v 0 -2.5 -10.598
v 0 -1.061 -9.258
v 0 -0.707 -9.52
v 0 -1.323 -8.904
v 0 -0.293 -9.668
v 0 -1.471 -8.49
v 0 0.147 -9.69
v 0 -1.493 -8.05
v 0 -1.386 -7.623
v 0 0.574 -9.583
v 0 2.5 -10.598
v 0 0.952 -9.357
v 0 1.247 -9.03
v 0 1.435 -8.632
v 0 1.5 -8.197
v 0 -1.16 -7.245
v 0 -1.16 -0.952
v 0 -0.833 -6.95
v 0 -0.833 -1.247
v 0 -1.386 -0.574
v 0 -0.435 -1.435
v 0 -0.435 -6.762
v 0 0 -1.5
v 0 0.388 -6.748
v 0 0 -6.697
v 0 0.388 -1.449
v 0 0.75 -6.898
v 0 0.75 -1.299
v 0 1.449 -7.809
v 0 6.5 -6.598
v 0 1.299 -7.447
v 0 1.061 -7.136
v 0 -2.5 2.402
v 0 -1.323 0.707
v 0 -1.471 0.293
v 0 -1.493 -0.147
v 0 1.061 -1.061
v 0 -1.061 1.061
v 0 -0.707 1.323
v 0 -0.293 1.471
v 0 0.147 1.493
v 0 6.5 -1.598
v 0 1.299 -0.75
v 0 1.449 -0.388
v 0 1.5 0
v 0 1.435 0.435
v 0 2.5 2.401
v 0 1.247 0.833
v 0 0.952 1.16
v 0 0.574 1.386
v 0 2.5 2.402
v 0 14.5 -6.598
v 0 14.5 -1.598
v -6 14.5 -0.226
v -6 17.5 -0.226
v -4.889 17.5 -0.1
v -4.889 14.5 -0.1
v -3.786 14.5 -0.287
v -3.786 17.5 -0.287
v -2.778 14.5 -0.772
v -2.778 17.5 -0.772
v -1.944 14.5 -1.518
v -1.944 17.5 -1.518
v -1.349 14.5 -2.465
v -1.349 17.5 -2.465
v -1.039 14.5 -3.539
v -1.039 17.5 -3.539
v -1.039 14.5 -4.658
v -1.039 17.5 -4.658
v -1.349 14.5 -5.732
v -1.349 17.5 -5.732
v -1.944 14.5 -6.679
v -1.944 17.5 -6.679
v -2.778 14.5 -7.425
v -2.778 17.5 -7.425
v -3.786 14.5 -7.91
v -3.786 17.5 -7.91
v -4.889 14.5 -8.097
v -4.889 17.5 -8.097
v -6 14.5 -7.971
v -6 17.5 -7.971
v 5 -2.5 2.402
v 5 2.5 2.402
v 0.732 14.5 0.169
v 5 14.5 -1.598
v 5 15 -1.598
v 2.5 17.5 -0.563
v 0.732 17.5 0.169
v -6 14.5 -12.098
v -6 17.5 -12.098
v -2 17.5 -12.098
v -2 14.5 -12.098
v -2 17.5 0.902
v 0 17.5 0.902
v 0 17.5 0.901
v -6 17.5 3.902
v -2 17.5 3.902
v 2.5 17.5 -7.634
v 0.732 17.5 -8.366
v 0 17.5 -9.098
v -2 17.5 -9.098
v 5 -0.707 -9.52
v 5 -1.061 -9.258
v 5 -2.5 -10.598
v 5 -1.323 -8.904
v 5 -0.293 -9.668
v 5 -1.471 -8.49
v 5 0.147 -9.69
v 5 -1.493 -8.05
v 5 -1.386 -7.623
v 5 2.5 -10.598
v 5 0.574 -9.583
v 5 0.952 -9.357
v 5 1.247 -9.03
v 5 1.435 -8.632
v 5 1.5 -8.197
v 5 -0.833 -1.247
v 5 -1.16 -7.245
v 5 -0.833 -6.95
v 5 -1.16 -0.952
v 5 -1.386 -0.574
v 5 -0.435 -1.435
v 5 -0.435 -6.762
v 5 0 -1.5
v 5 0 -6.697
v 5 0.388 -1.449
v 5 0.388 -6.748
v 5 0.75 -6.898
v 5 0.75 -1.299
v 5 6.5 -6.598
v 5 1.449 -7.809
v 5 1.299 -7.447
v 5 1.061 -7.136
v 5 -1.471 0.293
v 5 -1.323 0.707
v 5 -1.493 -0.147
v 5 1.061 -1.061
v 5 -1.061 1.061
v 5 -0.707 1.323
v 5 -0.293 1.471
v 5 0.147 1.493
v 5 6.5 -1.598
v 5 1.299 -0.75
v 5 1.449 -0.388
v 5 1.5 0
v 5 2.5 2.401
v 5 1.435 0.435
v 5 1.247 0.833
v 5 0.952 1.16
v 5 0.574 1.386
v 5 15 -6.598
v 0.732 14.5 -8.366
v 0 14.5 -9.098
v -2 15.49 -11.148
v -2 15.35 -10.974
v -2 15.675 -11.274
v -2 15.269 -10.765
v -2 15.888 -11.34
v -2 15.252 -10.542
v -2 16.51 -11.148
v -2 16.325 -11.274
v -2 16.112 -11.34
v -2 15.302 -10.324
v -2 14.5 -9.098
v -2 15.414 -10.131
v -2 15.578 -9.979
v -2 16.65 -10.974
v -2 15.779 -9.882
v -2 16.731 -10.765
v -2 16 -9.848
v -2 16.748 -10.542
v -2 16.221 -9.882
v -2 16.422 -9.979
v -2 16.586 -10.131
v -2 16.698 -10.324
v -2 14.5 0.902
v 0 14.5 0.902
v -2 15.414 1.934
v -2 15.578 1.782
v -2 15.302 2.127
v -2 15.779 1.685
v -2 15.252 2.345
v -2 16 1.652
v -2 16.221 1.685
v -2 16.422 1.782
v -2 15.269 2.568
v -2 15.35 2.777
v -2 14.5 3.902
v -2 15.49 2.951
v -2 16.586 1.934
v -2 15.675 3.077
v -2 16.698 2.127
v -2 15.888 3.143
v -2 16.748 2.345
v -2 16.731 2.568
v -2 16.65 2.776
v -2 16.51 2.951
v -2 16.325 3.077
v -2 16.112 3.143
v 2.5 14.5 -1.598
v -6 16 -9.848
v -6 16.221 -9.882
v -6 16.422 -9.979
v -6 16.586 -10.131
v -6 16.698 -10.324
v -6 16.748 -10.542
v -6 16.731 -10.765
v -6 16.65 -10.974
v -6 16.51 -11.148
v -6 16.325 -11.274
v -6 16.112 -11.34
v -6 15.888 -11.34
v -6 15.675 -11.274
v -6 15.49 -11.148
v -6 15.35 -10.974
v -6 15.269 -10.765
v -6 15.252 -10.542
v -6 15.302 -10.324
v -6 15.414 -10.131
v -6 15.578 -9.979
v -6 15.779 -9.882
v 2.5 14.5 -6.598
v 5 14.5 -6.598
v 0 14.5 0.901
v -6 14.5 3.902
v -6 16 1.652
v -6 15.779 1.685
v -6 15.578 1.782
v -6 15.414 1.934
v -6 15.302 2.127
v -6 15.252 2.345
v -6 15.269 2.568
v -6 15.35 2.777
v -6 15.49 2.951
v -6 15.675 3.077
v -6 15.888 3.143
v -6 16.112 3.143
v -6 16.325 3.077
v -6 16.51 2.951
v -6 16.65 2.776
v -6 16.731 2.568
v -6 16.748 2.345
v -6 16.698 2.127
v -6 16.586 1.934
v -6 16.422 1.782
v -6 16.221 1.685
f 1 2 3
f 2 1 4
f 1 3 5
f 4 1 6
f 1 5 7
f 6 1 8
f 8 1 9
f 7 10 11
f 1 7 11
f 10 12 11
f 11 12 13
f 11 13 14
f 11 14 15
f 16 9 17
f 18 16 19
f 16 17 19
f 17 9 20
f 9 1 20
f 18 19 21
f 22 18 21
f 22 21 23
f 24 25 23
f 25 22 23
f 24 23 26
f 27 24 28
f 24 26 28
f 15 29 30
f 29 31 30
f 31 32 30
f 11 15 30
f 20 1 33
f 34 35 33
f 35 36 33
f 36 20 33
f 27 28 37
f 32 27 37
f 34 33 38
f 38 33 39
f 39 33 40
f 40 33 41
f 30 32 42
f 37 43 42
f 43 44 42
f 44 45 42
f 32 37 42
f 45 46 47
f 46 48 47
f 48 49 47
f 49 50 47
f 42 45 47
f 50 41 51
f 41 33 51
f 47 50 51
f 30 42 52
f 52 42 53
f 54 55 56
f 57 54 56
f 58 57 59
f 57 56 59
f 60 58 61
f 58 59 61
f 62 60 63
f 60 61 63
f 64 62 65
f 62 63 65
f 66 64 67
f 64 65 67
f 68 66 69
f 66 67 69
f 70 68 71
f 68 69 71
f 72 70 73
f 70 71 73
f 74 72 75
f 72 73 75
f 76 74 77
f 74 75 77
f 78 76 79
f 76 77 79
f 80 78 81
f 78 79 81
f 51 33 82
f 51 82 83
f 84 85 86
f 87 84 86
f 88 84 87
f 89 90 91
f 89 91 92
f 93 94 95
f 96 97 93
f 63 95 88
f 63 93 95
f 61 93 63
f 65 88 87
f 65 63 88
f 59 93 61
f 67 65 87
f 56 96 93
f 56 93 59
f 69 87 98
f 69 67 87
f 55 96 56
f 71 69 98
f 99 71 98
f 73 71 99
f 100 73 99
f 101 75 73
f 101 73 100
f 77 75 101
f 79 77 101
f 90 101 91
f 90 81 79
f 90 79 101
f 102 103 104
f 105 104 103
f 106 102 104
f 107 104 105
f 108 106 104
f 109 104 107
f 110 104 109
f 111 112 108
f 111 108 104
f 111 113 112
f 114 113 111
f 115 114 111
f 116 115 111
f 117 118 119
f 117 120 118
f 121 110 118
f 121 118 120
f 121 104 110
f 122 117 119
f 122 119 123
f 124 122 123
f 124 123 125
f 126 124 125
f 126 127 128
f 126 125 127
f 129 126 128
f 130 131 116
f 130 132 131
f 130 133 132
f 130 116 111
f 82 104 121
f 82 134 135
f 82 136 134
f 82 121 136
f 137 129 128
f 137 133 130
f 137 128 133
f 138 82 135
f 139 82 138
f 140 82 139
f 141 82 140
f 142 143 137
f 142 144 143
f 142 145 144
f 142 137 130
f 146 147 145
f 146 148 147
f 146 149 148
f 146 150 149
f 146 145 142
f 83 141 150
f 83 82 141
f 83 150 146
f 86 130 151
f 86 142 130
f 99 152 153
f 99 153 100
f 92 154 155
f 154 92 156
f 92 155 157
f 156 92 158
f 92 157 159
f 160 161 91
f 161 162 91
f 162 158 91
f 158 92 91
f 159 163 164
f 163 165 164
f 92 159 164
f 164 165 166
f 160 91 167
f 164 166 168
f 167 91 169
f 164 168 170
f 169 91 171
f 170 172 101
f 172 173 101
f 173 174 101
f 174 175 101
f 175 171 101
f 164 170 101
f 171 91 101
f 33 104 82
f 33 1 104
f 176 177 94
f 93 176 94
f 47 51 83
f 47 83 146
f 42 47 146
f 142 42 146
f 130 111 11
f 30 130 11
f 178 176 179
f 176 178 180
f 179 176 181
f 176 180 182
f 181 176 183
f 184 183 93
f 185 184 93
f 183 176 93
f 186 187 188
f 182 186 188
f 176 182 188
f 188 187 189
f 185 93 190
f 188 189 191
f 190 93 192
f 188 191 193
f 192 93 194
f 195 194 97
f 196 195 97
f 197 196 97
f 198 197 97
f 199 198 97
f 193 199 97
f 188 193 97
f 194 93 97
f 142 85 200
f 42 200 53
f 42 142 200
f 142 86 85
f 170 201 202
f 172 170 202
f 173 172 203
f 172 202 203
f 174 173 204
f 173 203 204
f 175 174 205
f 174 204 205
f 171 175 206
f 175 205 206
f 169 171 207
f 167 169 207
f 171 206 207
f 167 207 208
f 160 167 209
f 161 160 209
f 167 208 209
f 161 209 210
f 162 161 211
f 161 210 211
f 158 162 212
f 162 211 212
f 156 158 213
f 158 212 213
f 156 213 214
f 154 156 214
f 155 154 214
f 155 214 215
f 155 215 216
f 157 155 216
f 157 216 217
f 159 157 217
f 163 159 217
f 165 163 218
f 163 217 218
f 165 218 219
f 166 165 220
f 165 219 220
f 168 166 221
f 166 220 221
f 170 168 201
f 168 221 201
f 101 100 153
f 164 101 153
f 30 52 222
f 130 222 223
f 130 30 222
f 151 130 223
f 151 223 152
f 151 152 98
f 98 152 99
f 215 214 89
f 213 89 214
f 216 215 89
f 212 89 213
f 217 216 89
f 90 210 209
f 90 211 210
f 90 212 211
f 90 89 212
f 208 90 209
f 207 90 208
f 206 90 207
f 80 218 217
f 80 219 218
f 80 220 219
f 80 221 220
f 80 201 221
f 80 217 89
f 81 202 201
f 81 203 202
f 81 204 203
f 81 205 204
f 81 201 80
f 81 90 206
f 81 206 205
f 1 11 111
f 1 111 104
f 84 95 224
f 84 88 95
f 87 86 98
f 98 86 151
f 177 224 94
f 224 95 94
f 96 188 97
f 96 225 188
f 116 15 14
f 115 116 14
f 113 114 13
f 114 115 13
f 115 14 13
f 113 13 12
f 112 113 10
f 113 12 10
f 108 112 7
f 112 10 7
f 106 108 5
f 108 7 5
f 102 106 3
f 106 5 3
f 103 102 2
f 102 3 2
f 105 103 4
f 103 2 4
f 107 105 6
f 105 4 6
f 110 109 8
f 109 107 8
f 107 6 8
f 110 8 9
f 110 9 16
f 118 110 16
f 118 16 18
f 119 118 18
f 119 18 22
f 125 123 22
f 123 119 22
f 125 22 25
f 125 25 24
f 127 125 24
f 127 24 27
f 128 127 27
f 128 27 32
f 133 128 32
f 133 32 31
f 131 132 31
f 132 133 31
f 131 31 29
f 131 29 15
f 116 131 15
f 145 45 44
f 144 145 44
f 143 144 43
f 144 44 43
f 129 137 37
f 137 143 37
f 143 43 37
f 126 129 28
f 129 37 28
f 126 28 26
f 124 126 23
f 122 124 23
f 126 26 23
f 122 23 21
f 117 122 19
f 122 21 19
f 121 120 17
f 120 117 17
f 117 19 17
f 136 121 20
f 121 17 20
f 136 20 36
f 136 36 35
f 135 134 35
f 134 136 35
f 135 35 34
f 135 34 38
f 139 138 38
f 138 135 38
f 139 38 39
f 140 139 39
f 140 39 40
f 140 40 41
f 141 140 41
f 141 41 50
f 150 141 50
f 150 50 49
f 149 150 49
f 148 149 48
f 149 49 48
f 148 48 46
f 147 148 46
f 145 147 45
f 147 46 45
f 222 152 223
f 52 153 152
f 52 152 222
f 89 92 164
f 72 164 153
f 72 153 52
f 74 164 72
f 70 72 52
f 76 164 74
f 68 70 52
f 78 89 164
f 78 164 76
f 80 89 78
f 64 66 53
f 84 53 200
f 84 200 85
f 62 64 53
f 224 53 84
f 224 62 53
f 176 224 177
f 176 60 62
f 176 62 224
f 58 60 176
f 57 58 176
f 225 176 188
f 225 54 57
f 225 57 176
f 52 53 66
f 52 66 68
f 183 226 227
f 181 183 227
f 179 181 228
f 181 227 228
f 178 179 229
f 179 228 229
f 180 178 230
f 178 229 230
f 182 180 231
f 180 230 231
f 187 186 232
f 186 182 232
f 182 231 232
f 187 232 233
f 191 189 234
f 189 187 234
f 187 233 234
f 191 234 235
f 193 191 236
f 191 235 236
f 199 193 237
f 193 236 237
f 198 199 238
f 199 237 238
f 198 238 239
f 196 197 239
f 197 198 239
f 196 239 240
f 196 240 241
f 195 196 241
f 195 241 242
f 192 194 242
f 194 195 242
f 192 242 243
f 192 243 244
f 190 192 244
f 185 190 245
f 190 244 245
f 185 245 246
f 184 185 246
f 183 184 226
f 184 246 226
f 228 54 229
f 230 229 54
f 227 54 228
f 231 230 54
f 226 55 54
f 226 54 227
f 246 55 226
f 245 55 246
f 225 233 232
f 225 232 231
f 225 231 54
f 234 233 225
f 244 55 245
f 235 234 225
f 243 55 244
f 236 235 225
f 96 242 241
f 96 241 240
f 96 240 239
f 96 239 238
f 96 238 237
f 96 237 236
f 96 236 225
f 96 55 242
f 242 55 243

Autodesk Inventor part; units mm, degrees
ref_plane "YZ Plane" through (0, 0, 0) normal (1, 0, 0) x (0, 1, 0)
ref_plane "XZ Plane" through (0, 0, 0) normal (0, 1, 0) x (-1, 0, 0)
sketch "Эскиз1" plane through (0, 0, 0) normal (1, 0, 0) x (0, 1, 0)
  line L0 (0, 0) -> (0, -8.197)
  circle A0 centre (0, 0) radius 1.5
  circle A1 centre (0, -8.197) radius 1.5
  line L1 (-2.5, 2.4015) -> (2.5, 2.4015)
  line L2 (2.5, 2.4015) -> (2.5, -10.5985)
  line L3 (2.5, -10.5985) -> (-2.5, -10.5985)
  line L4 (-2.5, -10.5985) -> (-2.5, 2.4015)
  line L5 (-2.5, 2.4015) -> (2.5, -10.5985) construction
  line L6 (2.5, 2.4015) -> (-2.5, -10.5985) construction
  point P0 (0, -4.0985)
  dimension "d0" = 8.197
  dimension "d1" = 3
  dimension "d2" = 3
  dimension "d3" = 5
  dimension "d4" = 13
extrude "Выдавливание1" add sketch "Эскиз1" along normal blind 5
sketch "Эскиз2" plane through (0, 2.5, 2.4015) normal (0, 1, 0) x (1, 0, 0)
  line L0 (0, 0) -> (5, 0) projected
  line L1 (2.5, 0) -> (2.5, 13)
  line L2 (0, 13) -> (5, 13) projected
  line L3 (0, 13) -> (0, 0) projected
  line L4 (5, 4) -> (0, 4)
  line L5 (0, 4) -> (0, 9)
  line L6 (0, 9) -> (5, 9)
  line L7 (5, 9) -> (5, 4)
  line L8 (5, 4) -> (0, 9) construction
  line L9 (0, 4) -> (5, 9) construction
  point P0 (0, 2.4015)
  point P1 (2.5, 6.5)
  dimension "d7" = 5
extrude "Выдавливание2" add sketch "Эскиз2" along normal blind 15 contours L3 L6 L1 L4 | L1 L6 L7 L4
sketch "Эскиз3" plane through (0, 0, 0) normal (-1, 0, 0) x (0, 0, 1)
  line L0 (-1.5985, 17.5) -> (-6.5985, 17.5) projected
  line L1 (-4.0985, 17.5) -> (-4.0985, 16)
  line L2 (-9.0985, 14.5) -> (0.9015, 14.5)
  line L3 (0.9015, 14.5) -> (0.9015, 17.5)
  line L4 (0.9015, 17.5) -> (-9.0985, 17.5)
  line L5 (-9.0985, 17.5) -> (-9.0985, 14.5)
  line L6 (-9.0985, 14.5) -> (0.9015, 17.5) construction
  line L7 (0.9015, 14.5) -> (-9.0985, 17.5) construction
  point P0 (0, 0)
  dimension "d10" = 1.5
  dimension "d11" = 10
  dimension "d12" = 3
extrude "Выдавливание3" add sketch "Эскиз3" along normal blind 10
sketch "Эскиз4" plane through (0, 17.5, 2.4015) normal (0, 1, 0) x (1, 0, 0)
  line L0 (0, 1.5) -> (-10, 1.5) projected
  line L1 (-5, 1.5) -> (-5, 11.5)
  line L2 (0, 11.5) -> (-10, 11.5) projected
  circle A0 centre (-5, 6.5) radius 4
  line L3 (-10, 1.5) -> (-10, 11.5) projected
  line L4 (-10, 1.5) -> (-10, 11.5)
  point P0 (0, 2.4015)
  point P1 (-7.0808, 9.9162)
  point P2 (-7.0808, 3.0838)
  dimension "d15" = 8
extrude "Выдавливание4" cut sketch "Эскиз4" against normal blind 10 contours A0 L1 | L1 A0
chamfer "Фаска1" distance 2.5 angle 45 2 edges at (0, 16, -1.5985) (0, 16, -6.5985)
chamfer "Фаска2" distance 4 angle 45 2 edges at (2.5, 2.5, -6.5985) (2.5, 2.5, -1.5985)
sketch "Эскиз5" plane through (-10, 0, 0) normal (-1, 0, 0) x (0, 0, 1)
  line L0 (-9.0985, 14.5) -> (0.9015, 14.5) projected
  line L1 (-9.0985, 14.5) -> (-12.0985, 14.5)
  line L2 (0.9015, 17.5) -> (-9.0985, 17.5) projected
  line L3 (-12.0985, 14.5) -> (-9.0985, 14.5)
  line L4 (-9.0985, 14.5) -> (-9.0985, 17.5)
  line L5 (-9.0985, 17.5) -> (-12.0985, 17.5)
  line L6 (-12.0985, 17.5) -> (-12.0985, 14.5)
  line L7 (0.9015, 17.5) -> (3.9015, 17.5)
  line L8 (3.9015, 17.5) -> (3.9015, 14.5)
  line L9 (3.9015, 14.5) -> (0.9015, 14.5)
  line L10 (0.9015, 14.5) -> (0.9015, 17.5)
  line L11 (-9.0985, 17.5) -> (0.9015, 17.5)
  line L12 (0.9015, 17.5) -> (0.9015, 14.5)
  line L13 (0.9015, 14.5) -> (-9.0985, 14.5)
  line L14 (-9.0985, 14.5) -> (-9.0985, 17.5)
  point P0 (0, 0)
  dimension "d24" = 3
  dimension "d25" = 3
  dimension "d26" = 3
extrude "Выдавливание5" cut sketch "Эскиз5" against normal blind 4
sketch "Эскиз6" plane through (-6, 0, 0) normal (-1, 0, 0) x (0, 0, 1)
  line L0 (-9.0985, 17.5) -> (-9.0985, 14.5) projected
  line L1 (-9.0985, 17.5) -> (-12.0985, 17.5)
  line L2 (-12.0985, 17.5) -> (-12.0985, 14.5)
  line L3 (-12.0985, 14.5) -> (-9.0985, 14.5)
  line L4 (-9.0985, 14.5) -> (-9.0985, 17.5)
  line L5 (-1.5985, 14.5) -> (-6.5985, 14.5) projected
  line L6 (-4.0985, 14.5) -> (-4.0985, 15.1912)
  line L7 (-12.0985, 17.5) -> (-10.5985, 17.5)
  line L8 (-12.0985, 16) -> (-12.0985, 17.5)
  circle A0 centre (-10.5985, 16) radius 0.75
  point P0 (0, 0)
  dimension "d29" = 3
  dimension "d30" = 3
  dimension "d33" = 1.5
ref_plane "РабПлоскость1" through (-1, 17.5, -4.0985) normal (0, 0, -1) x (-1, 0, 0)
extrude "Выдавливание6" add sketch "Эскиз6" against normal blind 4
mirror "Зеркальное отражение1" about plane through (-1, 17.5, -4.0985) normal (0, 0, -1) of "Выдавливание6"
sketch "Эскиз7" plane through (-6, 0, 0) normal (-1, 0, 0) x (0, 0, 1)
  line L0 (-7.9715, 17.5) -> (-12.0985, 17.5) projected
  circle A0 centre (-10.5985, 16) radius 0.75 projected
  line L1 (-7.9715, 14.5) -> (-12.0985, 14.5) projected
  line L2 (-7.9715, 17.5) -> (-7.9715, 14.5) projected
  line L3 (-7.9715, 17.5) -> (-12.0985, 17.5) projected
  line L4 (-12.0985, 17.5) -> (-12.0985, 14.5) projected
  circle A1 centre (2.4015, 16) radius 0.75 projected
  line L5 (-0.2255, 14.5) -> (-0.2255, 17.5) projected
  line L6 (3.9015, 14.5) -> (-0.2255, 14.5) projected
  line L7 (3.9015, 17.5) -> (3.9015, 14.5) projected
  line L8 (-0.2255, 17.5) -> (3.9015, 17.5) projected
  line L9 (-7.9715, 17.5) -> (-7.9715, 14.5) projected
  line L10 (-0.2255, 14.5) -> (-7.9715, 14.5) projected
  line L11 (-0.2255, 14.5) -> (-0.2255, 17.5) projected
  line L12 (-7.9715, 17.5) -> (-0.2255, 17.5) projected
  point P0 (0, 0)
chamfer "Фаска3" distance 2.5 angle 45 3 edges at (2.4995, 16, -1.5985) (2.4995, 16, -6.5985) (5, 17.5, -4.0985)
properties part number "КВ33.044.207 - Крепление вакумной присоски"
